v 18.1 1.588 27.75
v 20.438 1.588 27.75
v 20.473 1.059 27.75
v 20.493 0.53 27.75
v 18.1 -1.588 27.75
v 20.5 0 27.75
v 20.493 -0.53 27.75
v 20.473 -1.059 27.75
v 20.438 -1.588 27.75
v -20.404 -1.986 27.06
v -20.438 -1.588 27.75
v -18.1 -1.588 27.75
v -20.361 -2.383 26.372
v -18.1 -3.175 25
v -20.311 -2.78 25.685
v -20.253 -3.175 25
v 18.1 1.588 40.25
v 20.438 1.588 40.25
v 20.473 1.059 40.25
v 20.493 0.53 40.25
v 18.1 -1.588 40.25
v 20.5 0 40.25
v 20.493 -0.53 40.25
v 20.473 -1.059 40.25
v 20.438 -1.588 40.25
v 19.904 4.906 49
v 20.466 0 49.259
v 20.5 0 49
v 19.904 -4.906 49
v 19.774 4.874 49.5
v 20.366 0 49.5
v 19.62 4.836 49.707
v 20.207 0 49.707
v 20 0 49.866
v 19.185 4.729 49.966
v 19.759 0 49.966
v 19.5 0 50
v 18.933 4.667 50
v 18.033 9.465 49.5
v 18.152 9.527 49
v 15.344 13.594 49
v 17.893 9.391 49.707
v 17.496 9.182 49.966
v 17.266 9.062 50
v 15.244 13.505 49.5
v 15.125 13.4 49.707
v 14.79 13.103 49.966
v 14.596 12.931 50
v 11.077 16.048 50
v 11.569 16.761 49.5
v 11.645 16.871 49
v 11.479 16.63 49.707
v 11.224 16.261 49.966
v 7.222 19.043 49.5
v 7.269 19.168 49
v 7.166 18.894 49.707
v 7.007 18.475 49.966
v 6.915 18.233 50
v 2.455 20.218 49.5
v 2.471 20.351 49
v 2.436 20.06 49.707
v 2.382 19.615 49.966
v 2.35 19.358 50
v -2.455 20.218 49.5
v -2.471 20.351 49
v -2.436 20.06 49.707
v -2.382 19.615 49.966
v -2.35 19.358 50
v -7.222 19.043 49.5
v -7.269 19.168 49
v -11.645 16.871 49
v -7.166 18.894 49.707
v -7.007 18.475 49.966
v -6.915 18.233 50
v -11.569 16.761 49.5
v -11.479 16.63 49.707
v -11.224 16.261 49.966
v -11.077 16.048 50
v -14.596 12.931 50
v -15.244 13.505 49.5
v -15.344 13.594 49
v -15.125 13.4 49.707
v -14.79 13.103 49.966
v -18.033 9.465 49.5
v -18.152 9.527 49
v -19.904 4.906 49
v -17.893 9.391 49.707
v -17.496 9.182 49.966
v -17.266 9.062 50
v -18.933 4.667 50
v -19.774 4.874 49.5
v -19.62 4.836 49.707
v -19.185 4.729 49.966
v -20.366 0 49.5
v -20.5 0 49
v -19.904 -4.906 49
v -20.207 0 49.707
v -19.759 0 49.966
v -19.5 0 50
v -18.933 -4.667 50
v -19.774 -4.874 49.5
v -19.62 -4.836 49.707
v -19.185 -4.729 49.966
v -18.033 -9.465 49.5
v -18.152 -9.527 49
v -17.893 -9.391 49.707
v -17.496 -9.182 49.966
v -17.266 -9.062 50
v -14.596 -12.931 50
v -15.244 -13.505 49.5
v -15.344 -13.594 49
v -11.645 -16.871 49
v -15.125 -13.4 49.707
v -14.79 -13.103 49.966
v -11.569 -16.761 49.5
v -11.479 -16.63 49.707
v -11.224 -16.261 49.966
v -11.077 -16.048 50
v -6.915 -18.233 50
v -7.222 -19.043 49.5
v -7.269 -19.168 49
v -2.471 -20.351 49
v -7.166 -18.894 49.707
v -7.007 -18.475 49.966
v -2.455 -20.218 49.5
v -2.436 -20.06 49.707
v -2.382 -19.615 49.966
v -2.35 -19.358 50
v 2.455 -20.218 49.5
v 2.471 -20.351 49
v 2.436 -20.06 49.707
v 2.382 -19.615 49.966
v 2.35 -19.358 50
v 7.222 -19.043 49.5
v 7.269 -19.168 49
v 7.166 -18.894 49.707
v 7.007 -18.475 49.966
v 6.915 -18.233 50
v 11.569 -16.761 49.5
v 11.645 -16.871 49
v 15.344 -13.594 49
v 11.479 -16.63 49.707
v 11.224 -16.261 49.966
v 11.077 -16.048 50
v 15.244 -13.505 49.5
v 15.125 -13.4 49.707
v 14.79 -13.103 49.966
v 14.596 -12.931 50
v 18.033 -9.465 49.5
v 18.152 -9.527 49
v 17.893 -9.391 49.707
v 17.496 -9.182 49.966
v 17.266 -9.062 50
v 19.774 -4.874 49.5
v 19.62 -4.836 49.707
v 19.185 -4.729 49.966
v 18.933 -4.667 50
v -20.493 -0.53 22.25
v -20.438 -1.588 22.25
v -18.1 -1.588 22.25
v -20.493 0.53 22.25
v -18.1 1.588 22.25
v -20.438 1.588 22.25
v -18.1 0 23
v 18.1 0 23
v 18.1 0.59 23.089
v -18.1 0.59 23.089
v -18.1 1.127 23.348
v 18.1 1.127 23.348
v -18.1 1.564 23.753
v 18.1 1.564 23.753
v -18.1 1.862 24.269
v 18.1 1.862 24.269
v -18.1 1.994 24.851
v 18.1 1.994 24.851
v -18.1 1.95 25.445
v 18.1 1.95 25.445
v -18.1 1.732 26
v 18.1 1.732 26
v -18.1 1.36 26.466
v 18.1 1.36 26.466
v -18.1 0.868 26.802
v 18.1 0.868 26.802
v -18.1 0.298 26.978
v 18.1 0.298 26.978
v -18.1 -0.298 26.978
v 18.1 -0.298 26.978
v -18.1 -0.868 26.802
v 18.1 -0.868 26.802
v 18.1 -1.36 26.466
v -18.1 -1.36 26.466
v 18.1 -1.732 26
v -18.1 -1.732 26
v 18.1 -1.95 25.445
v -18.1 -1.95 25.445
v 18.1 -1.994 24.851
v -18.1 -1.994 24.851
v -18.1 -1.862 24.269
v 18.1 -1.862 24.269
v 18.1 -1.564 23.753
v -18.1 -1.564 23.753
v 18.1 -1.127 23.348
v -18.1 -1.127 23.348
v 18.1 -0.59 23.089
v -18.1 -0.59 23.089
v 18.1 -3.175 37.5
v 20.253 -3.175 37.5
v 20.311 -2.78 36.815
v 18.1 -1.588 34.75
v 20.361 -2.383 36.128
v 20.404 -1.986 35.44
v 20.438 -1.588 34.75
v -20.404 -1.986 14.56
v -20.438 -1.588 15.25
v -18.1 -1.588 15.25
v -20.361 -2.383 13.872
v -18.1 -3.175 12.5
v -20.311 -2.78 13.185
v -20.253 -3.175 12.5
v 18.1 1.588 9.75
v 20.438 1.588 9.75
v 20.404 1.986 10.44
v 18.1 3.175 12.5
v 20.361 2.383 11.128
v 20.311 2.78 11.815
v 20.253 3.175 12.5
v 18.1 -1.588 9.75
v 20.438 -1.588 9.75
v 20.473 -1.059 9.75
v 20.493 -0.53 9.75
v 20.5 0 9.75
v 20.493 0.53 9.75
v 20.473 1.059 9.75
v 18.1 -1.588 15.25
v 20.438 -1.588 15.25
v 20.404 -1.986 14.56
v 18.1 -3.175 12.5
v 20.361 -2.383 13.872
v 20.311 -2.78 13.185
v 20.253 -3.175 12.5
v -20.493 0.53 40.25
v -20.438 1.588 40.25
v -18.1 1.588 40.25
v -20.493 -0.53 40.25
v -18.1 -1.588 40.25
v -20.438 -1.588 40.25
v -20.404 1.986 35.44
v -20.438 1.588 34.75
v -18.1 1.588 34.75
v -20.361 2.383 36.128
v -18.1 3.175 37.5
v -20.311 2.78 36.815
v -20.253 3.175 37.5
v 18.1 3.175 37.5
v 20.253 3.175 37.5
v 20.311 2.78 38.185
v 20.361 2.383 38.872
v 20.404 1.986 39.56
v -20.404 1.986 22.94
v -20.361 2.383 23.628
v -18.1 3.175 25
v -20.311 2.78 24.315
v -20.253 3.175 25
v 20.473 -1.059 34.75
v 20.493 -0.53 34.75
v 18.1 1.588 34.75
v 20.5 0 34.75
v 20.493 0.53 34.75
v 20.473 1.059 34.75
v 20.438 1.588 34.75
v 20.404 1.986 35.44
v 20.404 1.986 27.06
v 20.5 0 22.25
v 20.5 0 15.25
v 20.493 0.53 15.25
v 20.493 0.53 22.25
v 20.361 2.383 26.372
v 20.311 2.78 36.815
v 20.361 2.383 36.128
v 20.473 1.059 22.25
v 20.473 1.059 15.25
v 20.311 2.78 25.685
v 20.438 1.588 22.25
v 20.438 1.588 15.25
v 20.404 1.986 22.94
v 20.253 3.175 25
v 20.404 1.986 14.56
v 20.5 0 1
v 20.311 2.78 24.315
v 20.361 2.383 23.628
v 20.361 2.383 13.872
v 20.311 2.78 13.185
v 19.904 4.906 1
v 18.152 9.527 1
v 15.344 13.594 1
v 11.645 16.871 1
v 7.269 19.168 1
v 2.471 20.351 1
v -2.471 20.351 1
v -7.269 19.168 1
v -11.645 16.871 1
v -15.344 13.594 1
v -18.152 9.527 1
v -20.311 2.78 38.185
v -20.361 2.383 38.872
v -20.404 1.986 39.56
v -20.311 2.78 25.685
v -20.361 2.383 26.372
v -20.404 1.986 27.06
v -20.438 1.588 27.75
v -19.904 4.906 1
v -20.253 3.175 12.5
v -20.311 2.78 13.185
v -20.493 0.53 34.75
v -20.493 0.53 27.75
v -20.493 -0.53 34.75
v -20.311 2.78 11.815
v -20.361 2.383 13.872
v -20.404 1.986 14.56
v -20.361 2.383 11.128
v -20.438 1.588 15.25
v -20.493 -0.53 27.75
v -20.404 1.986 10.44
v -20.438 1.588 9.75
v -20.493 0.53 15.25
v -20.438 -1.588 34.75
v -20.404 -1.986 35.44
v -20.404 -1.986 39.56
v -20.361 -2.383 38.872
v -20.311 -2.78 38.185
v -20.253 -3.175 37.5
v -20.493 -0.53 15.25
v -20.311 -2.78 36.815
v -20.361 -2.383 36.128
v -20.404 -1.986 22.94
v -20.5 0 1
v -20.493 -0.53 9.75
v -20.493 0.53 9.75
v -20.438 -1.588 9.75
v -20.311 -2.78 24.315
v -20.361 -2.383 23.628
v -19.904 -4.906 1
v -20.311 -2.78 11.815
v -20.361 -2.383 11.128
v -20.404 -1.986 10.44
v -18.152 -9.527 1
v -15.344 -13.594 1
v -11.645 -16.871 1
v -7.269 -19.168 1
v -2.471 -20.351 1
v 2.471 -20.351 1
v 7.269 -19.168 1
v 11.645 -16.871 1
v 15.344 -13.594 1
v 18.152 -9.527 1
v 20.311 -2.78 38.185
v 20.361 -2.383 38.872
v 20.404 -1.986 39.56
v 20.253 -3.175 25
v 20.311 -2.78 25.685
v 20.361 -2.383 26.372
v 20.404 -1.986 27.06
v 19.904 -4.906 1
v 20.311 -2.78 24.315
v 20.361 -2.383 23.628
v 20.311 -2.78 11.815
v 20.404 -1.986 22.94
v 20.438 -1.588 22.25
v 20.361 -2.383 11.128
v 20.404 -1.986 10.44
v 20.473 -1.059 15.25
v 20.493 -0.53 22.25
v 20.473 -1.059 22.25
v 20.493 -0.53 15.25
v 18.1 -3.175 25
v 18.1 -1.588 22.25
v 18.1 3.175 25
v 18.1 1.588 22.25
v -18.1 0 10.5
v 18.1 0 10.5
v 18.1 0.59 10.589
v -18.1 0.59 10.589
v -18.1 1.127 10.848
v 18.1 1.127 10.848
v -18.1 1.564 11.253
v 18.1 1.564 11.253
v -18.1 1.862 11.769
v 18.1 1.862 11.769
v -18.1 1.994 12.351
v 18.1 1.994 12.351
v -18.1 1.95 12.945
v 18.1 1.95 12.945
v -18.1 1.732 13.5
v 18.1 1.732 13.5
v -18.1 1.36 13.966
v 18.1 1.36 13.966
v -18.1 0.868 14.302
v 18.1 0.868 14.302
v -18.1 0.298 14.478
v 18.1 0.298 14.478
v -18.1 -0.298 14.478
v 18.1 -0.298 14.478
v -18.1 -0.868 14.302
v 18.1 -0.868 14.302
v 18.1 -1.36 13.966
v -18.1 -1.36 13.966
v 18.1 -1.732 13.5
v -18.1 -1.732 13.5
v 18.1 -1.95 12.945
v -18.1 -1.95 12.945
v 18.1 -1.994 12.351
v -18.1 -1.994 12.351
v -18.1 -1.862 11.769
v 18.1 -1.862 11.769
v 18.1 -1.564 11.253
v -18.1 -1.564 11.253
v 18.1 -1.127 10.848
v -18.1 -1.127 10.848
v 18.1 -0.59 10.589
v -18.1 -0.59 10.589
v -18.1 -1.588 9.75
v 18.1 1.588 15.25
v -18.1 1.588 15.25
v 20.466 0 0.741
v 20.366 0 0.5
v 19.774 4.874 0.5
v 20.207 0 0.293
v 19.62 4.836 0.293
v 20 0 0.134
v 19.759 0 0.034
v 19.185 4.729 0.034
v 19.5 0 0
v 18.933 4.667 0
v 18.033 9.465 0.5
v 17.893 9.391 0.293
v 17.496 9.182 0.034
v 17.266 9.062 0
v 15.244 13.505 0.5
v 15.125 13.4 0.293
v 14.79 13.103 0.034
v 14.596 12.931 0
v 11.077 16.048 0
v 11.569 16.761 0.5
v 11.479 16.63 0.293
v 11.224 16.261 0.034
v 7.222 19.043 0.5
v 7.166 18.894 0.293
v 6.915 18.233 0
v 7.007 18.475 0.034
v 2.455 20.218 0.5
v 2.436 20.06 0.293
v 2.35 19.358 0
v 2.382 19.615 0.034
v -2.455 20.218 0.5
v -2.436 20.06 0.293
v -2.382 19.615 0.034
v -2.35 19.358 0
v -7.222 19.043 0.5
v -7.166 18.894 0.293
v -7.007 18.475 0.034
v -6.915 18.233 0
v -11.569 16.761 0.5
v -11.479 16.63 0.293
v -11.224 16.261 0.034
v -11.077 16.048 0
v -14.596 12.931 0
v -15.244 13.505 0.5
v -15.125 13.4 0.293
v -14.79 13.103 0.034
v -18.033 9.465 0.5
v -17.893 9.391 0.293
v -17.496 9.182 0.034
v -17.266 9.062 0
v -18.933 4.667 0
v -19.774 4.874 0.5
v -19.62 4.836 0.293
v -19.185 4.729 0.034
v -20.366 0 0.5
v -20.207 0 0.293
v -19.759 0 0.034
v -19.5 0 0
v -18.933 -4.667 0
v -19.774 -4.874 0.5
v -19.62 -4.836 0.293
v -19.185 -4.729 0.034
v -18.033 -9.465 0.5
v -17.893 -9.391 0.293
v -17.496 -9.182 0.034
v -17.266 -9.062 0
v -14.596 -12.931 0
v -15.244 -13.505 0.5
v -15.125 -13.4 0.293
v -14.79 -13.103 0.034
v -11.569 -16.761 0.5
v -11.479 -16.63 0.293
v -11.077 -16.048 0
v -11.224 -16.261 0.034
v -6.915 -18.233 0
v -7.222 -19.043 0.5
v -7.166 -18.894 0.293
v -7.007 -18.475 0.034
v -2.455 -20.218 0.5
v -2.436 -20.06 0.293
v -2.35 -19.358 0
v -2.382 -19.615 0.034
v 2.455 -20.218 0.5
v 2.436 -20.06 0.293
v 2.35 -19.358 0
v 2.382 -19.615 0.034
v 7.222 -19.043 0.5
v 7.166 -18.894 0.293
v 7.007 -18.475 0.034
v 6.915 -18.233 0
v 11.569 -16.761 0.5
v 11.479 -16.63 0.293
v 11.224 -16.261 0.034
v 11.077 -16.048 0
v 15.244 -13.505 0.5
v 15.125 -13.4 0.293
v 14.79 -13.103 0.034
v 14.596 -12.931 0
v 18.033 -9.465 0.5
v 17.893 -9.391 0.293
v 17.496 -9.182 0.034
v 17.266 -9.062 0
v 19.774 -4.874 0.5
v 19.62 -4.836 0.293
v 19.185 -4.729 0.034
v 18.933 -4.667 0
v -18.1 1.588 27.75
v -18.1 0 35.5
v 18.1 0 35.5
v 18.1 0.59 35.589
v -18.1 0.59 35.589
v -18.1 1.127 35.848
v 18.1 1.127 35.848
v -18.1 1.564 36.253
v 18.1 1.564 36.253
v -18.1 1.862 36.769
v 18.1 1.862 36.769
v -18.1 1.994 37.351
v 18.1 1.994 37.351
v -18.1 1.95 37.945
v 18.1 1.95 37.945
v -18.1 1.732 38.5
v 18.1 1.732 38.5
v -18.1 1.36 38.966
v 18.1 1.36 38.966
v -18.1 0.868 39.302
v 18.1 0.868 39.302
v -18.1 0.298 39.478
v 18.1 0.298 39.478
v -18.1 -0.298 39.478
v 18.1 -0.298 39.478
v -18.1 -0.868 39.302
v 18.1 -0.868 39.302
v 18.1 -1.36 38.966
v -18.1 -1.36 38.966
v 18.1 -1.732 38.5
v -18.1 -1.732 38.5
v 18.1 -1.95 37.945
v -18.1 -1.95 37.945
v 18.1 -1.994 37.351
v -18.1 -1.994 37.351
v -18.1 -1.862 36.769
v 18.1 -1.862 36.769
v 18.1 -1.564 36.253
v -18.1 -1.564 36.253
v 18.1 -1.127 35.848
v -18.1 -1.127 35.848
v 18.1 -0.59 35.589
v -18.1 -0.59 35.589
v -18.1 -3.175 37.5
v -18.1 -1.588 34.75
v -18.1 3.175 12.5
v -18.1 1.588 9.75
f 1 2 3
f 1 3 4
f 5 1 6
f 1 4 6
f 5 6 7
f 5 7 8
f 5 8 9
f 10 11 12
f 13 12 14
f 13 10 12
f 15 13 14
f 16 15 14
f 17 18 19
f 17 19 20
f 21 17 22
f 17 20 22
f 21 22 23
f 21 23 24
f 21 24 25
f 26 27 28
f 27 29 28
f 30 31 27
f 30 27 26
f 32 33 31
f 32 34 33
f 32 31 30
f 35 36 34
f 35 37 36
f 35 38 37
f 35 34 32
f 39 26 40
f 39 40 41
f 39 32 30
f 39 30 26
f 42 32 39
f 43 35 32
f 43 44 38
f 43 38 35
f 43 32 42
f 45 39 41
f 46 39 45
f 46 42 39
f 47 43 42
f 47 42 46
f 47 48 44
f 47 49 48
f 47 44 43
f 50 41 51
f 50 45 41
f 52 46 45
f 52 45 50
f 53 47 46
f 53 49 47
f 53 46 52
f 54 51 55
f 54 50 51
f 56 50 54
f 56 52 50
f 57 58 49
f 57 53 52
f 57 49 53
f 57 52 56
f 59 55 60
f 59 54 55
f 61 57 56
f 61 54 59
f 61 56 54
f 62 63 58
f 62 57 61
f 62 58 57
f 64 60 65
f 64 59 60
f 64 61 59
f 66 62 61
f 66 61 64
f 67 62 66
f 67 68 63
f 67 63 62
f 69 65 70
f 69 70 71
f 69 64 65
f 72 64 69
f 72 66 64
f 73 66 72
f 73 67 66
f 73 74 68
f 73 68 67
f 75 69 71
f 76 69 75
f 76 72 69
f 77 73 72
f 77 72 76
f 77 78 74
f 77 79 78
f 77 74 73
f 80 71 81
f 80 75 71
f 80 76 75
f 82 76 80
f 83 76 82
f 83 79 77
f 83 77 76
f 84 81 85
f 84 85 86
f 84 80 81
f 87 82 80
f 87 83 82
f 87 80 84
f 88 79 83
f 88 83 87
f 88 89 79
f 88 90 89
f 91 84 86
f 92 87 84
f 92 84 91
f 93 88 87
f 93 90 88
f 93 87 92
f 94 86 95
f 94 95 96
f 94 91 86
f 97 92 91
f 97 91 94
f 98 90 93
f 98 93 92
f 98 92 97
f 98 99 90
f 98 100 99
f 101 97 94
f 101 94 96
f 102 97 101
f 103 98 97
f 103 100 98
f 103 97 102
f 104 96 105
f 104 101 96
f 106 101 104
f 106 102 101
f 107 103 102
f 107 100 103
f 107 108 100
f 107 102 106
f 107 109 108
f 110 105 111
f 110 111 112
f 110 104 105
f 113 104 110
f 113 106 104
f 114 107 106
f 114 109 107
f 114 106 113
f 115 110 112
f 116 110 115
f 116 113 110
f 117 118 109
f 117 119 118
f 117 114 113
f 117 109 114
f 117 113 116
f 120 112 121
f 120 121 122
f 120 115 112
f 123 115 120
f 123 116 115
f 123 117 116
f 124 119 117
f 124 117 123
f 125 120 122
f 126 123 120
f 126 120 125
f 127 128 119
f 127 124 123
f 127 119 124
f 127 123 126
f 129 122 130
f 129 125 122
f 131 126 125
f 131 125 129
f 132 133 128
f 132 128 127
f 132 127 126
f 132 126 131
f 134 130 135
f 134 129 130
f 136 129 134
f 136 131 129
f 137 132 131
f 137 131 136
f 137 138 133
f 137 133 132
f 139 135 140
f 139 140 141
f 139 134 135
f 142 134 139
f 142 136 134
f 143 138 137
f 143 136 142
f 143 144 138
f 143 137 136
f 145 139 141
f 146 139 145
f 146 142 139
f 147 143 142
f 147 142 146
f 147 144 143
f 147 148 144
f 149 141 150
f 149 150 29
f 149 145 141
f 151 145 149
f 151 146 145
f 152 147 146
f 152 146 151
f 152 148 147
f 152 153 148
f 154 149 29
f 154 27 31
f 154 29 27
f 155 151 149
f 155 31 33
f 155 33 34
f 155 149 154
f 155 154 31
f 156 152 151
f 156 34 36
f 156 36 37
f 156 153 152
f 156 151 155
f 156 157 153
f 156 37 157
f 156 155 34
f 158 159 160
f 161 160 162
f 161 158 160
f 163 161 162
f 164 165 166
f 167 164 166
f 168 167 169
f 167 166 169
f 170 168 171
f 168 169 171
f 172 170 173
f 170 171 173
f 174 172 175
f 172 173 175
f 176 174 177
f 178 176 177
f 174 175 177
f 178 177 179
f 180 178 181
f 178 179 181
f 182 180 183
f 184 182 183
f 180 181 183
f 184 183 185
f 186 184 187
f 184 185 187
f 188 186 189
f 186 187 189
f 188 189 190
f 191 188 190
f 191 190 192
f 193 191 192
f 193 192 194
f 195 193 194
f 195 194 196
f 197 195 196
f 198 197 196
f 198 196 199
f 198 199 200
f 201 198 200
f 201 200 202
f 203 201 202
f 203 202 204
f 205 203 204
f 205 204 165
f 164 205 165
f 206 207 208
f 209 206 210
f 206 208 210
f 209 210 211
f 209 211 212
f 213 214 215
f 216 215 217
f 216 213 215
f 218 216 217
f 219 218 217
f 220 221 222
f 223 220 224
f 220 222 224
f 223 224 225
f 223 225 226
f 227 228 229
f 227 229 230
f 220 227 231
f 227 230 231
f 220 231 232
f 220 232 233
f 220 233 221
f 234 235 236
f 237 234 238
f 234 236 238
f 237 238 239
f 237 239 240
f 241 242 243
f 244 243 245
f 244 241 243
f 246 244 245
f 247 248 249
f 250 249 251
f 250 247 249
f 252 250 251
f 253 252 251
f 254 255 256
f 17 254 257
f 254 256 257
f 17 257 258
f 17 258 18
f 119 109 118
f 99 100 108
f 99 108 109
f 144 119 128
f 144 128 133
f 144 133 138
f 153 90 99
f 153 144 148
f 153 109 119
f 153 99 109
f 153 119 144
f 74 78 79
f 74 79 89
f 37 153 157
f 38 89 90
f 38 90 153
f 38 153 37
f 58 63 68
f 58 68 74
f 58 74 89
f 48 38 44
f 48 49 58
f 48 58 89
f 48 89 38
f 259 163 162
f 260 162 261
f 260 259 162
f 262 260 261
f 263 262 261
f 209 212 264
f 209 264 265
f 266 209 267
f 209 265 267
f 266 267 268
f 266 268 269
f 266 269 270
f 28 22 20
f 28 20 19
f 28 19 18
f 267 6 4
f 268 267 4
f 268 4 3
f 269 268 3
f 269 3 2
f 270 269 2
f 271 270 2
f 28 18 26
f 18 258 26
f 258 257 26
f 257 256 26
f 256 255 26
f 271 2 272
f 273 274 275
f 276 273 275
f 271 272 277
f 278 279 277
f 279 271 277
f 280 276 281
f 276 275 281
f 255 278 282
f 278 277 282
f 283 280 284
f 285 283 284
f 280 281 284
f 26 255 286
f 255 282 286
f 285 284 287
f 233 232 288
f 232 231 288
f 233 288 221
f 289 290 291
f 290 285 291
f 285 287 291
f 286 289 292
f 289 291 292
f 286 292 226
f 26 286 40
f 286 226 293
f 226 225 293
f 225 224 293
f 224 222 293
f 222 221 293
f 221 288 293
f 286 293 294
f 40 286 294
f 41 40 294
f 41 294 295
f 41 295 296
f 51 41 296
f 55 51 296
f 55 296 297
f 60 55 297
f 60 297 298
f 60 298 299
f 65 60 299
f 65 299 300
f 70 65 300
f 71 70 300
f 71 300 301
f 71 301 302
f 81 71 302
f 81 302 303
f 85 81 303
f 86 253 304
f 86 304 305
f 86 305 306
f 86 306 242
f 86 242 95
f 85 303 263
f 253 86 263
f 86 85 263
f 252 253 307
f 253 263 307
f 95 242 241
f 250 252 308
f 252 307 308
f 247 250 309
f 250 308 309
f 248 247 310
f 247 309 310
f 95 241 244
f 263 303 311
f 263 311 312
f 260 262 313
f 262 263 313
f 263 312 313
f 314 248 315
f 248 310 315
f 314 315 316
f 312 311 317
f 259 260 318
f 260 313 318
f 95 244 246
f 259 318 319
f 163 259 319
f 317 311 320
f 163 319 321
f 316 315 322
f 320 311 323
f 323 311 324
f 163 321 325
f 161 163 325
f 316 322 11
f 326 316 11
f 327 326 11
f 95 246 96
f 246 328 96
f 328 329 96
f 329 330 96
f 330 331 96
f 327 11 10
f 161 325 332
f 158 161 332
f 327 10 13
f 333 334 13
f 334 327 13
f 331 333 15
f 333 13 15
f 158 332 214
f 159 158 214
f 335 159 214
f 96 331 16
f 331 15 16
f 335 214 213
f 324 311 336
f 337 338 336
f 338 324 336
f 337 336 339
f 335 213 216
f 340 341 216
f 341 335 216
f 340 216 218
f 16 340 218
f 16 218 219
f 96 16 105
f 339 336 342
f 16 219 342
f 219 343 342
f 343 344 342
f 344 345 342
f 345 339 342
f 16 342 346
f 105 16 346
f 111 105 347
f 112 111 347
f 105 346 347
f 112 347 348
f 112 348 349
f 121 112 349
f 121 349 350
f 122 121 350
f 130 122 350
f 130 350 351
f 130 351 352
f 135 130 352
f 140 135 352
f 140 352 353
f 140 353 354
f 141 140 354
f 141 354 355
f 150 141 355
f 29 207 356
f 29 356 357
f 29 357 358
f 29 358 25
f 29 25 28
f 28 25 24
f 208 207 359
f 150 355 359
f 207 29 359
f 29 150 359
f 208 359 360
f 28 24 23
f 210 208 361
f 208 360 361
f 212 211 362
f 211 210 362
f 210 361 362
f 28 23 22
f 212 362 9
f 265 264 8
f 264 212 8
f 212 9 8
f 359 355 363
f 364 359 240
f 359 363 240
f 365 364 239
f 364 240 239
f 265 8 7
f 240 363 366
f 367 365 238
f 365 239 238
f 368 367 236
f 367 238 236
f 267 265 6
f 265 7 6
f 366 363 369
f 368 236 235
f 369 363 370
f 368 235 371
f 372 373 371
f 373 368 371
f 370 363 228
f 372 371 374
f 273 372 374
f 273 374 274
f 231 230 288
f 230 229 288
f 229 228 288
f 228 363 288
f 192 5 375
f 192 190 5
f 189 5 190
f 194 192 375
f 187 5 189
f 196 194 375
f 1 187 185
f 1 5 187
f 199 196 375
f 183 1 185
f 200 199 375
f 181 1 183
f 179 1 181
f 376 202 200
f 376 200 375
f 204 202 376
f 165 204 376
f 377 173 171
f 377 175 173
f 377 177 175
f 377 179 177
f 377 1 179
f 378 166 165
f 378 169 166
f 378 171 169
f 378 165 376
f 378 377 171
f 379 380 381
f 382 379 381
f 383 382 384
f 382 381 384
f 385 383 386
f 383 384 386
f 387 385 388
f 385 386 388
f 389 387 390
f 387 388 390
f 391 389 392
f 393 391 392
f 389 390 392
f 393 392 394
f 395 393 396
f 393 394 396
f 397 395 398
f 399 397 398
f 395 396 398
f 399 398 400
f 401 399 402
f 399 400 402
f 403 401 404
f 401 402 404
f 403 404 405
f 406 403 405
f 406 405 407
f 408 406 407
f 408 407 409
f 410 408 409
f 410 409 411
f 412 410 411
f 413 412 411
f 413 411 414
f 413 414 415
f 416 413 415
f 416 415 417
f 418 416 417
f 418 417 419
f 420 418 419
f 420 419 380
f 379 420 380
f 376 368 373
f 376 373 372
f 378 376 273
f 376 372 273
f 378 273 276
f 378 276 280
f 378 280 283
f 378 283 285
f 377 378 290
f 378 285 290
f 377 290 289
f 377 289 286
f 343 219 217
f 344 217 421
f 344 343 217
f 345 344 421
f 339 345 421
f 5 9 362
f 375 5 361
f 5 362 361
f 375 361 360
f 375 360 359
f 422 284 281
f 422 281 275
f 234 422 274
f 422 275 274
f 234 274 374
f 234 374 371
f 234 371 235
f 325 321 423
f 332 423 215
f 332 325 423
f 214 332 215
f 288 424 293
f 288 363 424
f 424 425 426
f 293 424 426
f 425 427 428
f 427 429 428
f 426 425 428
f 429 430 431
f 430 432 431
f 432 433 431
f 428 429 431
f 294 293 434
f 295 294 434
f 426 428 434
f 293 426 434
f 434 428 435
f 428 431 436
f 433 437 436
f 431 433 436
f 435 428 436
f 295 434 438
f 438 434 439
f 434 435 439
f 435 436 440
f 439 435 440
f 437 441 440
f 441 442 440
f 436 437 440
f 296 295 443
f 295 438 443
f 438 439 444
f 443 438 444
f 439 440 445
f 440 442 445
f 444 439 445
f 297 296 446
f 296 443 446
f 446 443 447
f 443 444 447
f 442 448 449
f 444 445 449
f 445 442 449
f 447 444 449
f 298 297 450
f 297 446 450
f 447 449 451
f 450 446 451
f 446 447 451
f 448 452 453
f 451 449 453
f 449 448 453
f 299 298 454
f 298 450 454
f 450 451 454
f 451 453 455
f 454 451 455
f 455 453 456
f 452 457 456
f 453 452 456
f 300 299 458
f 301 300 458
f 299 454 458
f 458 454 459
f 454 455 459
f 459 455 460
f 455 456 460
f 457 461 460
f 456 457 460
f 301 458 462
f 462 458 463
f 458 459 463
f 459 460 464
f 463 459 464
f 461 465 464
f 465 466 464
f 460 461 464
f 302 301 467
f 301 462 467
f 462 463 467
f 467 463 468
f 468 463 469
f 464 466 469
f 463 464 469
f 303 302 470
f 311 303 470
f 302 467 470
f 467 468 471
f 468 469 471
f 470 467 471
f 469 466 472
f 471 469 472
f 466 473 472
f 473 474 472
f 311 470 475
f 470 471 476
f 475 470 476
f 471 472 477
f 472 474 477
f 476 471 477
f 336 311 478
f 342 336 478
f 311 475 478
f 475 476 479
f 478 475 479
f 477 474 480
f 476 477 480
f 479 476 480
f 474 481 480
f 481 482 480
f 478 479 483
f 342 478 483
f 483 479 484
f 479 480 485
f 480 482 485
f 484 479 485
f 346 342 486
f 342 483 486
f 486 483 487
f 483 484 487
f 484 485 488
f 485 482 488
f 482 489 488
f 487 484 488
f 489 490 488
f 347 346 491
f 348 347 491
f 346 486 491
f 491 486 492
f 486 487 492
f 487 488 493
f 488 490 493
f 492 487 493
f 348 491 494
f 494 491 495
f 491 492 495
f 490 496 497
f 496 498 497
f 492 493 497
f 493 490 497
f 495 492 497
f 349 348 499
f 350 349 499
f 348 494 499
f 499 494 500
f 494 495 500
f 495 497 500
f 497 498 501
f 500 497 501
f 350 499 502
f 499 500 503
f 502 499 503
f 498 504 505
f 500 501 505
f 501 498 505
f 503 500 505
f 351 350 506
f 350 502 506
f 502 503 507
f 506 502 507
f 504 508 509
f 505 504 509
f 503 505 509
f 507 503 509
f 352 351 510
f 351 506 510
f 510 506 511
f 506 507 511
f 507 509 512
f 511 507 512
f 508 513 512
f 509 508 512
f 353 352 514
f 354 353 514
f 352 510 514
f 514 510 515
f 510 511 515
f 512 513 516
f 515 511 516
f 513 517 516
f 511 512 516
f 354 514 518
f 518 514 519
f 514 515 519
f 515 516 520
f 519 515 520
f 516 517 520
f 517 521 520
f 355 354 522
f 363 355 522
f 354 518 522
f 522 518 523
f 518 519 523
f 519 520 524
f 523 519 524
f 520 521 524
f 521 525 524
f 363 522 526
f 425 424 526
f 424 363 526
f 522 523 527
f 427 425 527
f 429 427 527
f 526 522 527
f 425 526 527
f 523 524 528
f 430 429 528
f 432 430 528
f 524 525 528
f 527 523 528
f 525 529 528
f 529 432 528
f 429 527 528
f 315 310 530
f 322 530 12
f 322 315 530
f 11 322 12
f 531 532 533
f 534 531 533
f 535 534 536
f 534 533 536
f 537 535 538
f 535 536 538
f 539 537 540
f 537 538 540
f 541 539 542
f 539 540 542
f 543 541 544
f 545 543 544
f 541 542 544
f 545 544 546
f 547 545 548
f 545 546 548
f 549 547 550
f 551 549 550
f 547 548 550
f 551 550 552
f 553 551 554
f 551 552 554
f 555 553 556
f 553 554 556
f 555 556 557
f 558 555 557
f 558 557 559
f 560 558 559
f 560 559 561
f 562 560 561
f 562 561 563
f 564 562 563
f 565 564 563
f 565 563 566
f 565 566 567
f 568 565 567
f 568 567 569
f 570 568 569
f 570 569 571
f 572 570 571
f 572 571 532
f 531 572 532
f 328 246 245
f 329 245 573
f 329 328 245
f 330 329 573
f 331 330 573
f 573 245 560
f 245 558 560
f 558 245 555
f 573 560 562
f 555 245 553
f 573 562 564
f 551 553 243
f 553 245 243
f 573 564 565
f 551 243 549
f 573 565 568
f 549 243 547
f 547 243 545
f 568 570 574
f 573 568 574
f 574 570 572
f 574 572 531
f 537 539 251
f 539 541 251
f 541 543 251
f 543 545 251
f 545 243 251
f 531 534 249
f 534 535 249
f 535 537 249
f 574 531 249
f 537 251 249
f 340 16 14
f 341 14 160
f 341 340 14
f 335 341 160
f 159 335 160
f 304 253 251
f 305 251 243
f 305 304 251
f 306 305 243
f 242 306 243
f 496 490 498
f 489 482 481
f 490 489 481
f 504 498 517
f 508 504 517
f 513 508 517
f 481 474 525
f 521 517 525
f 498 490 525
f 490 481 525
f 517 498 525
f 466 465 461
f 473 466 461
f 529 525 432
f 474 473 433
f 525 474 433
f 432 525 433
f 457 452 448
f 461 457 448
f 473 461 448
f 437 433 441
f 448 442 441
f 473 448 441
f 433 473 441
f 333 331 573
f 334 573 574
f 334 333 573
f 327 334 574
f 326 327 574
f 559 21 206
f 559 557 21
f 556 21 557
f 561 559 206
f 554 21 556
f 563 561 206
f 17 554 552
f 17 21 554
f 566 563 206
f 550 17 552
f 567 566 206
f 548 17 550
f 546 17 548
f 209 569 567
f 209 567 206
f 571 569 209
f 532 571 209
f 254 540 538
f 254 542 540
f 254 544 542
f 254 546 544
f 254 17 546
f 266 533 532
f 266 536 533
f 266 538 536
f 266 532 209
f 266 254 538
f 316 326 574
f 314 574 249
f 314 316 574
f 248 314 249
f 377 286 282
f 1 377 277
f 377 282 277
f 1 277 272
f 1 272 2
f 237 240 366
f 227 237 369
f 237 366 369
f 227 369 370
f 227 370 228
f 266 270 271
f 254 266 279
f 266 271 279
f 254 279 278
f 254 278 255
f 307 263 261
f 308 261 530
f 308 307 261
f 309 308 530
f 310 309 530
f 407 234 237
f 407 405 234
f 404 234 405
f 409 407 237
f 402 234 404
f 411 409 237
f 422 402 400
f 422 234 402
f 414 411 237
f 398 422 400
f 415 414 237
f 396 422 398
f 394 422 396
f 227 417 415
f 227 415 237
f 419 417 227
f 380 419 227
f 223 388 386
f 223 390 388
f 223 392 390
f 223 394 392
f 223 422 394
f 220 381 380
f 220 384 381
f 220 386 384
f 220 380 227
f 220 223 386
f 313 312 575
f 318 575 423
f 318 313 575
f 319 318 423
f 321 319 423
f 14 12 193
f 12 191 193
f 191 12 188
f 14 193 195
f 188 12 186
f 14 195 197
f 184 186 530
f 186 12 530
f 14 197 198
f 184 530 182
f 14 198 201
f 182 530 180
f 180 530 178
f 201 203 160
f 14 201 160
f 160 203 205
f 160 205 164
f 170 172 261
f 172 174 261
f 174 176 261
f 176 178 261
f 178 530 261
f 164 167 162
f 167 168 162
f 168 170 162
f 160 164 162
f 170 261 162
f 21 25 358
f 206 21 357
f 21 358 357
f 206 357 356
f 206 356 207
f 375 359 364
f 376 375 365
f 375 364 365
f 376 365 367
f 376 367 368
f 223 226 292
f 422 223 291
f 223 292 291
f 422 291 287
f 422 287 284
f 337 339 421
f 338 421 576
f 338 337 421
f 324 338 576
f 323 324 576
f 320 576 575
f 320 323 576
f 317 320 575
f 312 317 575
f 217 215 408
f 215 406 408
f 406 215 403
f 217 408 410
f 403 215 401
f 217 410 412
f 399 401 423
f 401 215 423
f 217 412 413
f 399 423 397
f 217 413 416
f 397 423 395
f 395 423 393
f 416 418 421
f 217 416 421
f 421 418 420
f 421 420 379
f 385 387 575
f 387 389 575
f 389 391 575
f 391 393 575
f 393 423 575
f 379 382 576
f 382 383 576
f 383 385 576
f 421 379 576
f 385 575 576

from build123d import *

# Parameters (mm, degrees)
SKETCH_1_R          = 20.5
EXTRUDE_1_DEPTH     = 50
FILLET_1_R          = 1
FILLET_2_R          = 1
SKETCH_2_R          = 2
CUT_EXTRUDE_1_DEPTH = 68.832514358
CUT_EXTRUDE_2_DEPTH = 2.4


with BuildPart() as part:
    # Эскиз1 → Бобышка-Вытянуть1 (new body)
    with BuildSketch(Plane.XY):
        Circle(SKETCH_1_R)
    extrude(amount=EXTRUDE_1_DEPTH)

    # Скругление1
    fillet_1_edges = [part.edges().sort_by_distance(p)[0] for p in [
        (-20.5, 0, 50),
    ]]
    fillet(fillet_1_edges, radius=FILLET_1_R)

    # Скругление2
    fillet_2_edges = [part.edges().sort_by_distance(p)[0] for p in [
        (-20.5, 0, 0),
    ]]
    fillet(fillet_2_edges, radius=FILLET_2_R)

    # Эскиз2 → Вырез-Вытянуть1 (cut, through all)
    with BuildSketch(Plane(origin=(20.5, 0, 0), x_dir=(0, 0, -1), z_dir=(1, 0, 0))):
        with Locations((-37.5, 0)):
            Circle(SKETCH_2_R)
        with Locations((-25, 0)):
            Circle(SKETCH_2_R)
        with Locations((-12.5, 0)):
            Circle(SKETCH_2_R)
    extrude(amount=-CUT_EXTRUDE_1_DEPTH, mode=Mode.SUBTRACT)

    # Эскиз3 → Вырез-Вытянуть2 (cut)
    with BuildSketch(Plane(origin=(20.5, 0, 0), x_dir=(0, 0, -1), z_dir=(1, 0, 0))):
        Polygon((-25, 3.175426481), (-27.75, 1.58771324), (-27.75, -1.58771324), (-25, -3.175426481), (-22.25, -1.58771324), (-22.25, 1.58771324), align=None)
        Polygon((-37.5, 3.175426481), (-40.25, 1.58771324), (-40.25, -1.58771324), (-37.5, -3.175426481), (-34.75, -1.58771324), (-34.75, 1.58771324), align=None)
        Polygon((-12.5, 3.175426481), (-15.25, 1.58771324), (-15.25, -1.58771324), (-12.5, -3.175426481), (-9.75, -1.58771324), (-9.75, 1.58771324), align=None)
    cut_extrude_2 = extrude(amount=-CUT_EXTRUDE_2_DEPTH, mode=Mode.SUBTRACT)

    # Зеркальное отражение1: Вырез-Вытянуть2 across plane
    add(cut_extrude_2.mirror(Plane(origin=(0, 0, 0), x_dir=(0, 0, 1), z_dir=(1, 0, 0))), mode=Mode.SUBTRACT)


solid = part.part
